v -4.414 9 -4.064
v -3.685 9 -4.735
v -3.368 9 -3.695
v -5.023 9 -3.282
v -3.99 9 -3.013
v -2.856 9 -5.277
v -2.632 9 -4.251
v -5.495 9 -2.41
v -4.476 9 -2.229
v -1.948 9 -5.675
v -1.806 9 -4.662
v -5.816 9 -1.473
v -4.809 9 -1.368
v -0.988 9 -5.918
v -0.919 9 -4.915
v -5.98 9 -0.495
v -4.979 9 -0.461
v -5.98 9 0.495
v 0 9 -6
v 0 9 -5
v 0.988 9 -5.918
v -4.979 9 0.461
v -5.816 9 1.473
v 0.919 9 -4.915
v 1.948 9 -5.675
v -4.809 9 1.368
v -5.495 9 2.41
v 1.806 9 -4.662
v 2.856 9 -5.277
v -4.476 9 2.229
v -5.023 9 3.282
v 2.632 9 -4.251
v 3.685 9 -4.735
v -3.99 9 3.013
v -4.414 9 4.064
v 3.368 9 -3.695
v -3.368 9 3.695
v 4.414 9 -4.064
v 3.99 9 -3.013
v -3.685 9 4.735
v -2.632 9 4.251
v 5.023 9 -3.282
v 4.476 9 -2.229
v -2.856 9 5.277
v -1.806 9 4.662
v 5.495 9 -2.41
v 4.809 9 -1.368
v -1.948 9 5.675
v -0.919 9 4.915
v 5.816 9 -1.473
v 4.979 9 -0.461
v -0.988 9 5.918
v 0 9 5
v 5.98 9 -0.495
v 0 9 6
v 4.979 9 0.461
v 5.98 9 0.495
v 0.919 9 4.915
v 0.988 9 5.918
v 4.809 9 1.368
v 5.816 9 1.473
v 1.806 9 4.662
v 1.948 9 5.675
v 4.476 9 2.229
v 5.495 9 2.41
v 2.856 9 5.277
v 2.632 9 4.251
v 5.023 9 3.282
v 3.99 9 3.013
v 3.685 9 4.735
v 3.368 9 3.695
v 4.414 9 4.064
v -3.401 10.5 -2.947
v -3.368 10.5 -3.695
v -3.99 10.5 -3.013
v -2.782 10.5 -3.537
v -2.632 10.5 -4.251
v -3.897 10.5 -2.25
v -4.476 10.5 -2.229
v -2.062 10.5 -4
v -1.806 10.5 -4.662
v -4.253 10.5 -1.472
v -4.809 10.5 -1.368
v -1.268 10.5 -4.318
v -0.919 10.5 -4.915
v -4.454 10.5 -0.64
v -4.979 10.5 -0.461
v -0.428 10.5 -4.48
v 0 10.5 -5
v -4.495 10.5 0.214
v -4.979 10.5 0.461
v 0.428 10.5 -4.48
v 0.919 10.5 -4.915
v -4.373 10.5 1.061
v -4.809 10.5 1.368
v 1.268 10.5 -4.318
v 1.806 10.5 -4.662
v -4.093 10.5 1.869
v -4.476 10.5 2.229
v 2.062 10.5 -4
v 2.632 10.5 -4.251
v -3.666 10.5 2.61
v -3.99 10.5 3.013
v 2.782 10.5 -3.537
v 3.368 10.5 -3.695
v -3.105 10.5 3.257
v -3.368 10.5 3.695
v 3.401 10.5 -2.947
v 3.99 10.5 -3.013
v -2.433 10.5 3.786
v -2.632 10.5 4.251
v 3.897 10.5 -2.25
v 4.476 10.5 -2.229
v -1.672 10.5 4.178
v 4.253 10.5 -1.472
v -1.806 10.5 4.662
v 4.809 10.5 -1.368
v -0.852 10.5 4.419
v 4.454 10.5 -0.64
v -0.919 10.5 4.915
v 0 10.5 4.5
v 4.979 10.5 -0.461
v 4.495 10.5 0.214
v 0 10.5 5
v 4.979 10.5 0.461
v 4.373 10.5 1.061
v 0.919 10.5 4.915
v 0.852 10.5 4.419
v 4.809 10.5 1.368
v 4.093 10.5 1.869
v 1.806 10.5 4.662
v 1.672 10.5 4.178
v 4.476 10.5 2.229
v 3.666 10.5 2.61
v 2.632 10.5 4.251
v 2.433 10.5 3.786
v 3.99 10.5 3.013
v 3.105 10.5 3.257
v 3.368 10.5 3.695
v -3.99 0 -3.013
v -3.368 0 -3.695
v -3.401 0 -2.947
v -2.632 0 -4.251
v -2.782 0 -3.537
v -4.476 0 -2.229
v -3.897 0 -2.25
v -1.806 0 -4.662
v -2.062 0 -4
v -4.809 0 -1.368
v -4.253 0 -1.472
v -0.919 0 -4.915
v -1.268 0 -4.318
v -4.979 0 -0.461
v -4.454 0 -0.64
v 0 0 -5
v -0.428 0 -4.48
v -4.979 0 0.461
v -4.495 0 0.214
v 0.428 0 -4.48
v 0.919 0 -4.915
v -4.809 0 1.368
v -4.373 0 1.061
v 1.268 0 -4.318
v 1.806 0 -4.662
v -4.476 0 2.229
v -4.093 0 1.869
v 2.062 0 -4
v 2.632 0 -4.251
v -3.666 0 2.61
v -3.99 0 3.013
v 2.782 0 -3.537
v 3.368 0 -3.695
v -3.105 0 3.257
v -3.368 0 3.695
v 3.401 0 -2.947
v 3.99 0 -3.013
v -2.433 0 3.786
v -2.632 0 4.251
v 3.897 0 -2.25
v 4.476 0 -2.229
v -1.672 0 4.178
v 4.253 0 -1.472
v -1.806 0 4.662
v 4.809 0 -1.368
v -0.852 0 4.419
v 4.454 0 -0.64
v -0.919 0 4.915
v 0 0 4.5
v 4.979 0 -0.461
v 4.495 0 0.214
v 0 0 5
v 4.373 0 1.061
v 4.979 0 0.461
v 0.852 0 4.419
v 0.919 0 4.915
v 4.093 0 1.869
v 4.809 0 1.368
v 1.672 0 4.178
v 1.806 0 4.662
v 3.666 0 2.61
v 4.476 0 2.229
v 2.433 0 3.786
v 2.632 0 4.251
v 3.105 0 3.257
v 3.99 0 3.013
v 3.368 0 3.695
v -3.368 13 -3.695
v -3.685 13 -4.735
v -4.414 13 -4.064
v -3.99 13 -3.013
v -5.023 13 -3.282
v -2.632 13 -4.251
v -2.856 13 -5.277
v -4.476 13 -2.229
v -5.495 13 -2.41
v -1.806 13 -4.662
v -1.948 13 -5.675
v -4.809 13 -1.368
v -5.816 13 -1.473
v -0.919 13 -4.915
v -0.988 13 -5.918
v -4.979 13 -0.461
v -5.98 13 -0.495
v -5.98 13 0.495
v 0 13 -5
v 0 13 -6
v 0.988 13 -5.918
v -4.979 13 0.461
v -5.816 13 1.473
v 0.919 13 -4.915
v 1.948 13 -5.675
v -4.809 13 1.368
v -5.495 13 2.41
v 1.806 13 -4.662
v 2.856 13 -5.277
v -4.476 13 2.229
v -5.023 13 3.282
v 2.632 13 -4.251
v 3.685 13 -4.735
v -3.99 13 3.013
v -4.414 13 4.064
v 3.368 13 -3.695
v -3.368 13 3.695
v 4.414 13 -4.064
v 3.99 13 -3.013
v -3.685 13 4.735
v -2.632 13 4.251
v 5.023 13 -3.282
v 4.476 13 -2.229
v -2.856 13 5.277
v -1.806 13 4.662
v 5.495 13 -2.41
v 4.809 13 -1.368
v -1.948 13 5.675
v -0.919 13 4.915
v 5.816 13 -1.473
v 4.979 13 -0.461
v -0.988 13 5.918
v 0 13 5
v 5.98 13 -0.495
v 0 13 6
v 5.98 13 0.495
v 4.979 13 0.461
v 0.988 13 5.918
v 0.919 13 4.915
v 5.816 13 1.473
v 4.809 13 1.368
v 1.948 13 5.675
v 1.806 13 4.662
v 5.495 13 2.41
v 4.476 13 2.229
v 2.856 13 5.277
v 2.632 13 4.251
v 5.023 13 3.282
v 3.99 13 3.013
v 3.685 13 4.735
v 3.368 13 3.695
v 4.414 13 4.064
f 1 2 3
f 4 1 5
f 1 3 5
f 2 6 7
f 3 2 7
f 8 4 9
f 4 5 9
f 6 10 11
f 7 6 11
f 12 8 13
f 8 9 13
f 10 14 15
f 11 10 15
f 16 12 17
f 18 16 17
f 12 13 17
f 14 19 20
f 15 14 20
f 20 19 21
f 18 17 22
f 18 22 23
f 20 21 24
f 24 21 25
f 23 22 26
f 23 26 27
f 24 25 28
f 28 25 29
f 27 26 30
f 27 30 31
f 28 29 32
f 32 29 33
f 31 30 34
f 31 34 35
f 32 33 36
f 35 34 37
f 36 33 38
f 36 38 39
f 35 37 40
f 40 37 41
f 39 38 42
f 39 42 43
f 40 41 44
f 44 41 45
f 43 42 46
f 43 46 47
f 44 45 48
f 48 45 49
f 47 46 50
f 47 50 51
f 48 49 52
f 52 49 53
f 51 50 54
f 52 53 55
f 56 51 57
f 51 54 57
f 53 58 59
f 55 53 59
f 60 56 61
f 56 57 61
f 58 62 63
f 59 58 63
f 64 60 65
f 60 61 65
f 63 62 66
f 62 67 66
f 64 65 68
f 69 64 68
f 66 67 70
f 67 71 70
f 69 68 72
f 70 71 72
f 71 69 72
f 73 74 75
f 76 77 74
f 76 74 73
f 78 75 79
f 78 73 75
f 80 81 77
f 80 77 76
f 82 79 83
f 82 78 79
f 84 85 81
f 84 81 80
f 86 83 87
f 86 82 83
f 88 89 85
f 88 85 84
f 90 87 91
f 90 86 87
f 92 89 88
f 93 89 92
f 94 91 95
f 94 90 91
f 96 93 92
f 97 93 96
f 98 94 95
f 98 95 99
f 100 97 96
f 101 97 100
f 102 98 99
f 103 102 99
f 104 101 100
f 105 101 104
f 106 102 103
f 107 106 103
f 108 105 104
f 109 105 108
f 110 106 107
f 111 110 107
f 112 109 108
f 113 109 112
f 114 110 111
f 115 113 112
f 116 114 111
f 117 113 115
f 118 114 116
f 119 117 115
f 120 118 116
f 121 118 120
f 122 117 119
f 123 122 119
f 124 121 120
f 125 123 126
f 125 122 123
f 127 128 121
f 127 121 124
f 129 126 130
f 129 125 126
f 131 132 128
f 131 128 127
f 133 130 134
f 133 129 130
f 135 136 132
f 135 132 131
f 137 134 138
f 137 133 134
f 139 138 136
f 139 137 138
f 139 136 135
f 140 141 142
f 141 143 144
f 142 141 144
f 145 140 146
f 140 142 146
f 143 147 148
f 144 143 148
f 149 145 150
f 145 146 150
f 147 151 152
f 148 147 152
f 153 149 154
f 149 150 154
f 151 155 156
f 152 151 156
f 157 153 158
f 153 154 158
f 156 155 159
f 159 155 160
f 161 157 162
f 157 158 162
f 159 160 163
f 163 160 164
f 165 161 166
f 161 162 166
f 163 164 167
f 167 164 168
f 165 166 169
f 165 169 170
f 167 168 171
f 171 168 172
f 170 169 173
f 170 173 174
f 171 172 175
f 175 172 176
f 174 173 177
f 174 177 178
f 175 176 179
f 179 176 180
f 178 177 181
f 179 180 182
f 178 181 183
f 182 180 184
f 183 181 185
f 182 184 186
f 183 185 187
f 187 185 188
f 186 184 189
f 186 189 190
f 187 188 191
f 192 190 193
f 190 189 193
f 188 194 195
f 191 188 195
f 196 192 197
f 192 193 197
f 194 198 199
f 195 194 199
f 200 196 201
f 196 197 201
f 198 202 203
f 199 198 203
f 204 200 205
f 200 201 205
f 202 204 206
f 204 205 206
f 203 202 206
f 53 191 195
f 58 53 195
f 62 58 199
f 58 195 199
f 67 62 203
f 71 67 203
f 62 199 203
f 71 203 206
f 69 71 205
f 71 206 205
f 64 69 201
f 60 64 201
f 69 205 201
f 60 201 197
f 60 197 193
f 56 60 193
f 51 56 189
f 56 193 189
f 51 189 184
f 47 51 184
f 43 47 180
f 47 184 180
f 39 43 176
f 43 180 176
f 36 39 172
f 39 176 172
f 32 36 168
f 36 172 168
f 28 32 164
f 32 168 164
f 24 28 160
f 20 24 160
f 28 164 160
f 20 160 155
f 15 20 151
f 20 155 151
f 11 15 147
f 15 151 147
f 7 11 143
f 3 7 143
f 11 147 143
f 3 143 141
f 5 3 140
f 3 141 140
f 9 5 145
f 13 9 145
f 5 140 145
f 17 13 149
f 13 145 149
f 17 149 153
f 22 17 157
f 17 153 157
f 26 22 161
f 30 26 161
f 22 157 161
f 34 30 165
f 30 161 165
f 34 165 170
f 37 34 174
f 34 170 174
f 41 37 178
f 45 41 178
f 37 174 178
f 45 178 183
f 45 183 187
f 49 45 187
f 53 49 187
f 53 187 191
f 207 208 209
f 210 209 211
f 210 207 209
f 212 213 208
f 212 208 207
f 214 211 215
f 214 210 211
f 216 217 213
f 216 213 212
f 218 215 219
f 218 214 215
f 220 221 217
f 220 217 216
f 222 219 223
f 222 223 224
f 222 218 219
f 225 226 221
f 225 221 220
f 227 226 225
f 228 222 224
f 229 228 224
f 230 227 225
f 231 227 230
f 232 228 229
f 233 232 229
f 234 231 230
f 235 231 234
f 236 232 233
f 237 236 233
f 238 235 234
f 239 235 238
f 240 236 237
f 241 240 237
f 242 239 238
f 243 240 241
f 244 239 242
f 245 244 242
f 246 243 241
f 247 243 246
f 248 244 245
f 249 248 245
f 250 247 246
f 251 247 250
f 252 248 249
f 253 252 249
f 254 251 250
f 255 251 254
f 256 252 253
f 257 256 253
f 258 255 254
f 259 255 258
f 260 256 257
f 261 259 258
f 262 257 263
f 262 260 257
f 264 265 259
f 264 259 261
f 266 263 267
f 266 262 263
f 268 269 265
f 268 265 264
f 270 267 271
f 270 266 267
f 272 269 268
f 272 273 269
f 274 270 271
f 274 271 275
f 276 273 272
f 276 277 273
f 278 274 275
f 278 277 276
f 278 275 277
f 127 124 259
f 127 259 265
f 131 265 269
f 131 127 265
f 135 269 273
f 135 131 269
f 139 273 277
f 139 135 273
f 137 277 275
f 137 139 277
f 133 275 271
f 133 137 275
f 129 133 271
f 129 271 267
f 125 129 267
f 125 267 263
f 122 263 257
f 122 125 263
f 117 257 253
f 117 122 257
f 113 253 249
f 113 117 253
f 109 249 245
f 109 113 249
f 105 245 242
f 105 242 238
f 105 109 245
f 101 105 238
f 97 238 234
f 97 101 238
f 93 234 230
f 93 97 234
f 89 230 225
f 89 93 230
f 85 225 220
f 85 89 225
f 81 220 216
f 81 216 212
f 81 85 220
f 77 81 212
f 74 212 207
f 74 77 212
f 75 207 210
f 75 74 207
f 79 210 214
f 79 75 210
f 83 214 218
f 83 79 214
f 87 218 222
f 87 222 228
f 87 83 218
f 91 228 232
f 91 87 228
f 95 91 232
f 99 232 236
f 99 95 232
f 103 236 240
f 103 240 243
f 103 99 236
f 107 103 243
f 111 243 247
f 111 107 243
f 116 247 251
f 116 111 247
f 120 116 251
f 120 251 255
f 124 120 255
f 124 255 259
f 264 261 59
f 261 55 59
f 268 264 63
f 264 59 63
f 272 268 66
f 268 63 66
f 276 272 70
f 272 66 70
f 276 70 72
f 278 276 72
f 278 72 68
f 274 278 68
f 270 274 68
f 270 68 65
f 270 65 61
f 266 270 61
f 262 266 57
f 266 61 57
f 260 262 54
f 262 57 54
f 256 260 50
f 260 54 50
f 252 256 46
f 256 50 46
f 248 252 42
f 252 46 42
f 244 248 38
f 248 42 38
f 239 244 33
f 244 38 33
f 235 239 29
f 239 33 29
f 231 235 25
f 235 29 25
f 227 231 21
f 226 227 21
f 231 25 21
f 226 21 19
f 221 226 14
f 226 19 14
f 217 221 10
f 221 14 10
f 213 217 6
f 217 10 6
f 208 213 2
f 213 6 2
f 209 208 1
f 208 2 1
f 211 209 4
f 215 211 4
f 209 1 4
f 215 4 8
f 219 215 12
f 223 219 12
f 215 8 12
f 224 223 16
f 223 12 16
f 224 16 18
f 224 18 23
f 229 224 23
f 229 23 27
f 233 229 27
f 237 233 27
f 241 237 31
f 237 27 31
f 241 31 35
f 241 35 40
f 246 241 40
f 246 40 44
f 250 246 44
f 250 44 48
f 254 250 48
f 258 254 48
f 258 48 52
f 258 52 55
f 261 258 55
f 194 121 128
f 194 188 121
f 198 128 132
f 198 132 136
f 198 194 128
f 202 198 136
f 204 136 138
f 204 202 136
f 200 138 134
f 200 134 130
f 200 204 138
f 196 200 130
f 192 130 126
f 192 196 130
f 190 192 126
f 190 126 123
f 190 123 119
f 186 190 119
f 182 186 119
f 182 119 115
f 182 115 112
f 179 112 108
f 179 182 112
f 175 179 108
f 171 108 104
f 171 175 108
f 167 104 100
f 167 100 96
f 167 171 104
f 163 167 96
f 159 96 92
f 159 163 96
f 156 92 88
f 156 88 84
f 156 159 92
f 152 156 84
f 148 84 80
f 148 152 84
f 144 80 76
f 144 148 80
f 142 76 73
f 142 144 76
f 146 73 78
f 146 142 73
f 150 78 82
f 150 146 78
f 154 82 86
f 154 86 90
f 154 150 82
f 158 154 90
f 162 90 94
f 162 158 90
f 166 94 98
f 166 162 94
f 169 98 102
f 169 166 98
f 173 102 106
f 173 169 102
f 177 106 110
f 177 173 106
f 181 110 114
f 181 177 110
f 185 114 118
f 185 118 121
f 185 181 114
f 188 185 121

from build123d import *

# Parameters (mm, degrees)
ESQUISSE1_R        = 5
ESQUISSE1_R_2      = 4.5
BOSS_EXTRU_1_DEPTH = 9
ESQUISSE2_R        = 6
ESQUISSE2_R_2      = 5
ESQUISSE2_R_3      = 4.5
BOSS_EXTRU_2_DEPTH = 1.5
ESQUISSE3_R        = 6
ESQUISSE3_R_2      = 5
BOSS_EXTRU_3_DEPTH = 2.5


with BuildPart() as part:
    # Esquisse1 → Boss.-Extru.1 (new body)
    with BuildSketch(Plane(origin=(0, 0, 0), x_dir=(1, 0, 0), z_dir=(0, 1, 0))):
        with Locations(Location((0, 0, 0), (0, 0, 270))):
            Circle(ESQUISSE1_R)
        with Locations(Location((0, 0, 0), (0, 0, 270))):
            Circle(ESQUISSE1_R_2, mode=Mode.SUBTRACT)
    extrude(amount=BOSS_EXTRU_1_DEPTH)

    # Esquisse2 → Boss.-Extru.2 (add)
    # profile 1 of 2: a face of its own
    with BuildSketch(Plane(origin=(0, 9, 0), x_dir=(1, 0, 0), z_dir=(0, 1, 0))):
        with Locations(Location((0, 0, 0), (0, 0, 270))):
            Circle(ESQUISSE2_R)
        with Locations(Location((0, 0, 0), (0, 0, 270))):
            Circle(ESQUISSE2_R_2, mode=Mode.SUBTRACT)
    # profile 2 of 2: a face of its own
    with BuildSketch(Plane(origin=(0, 9, 0), x_dir=(1, 0, 0), z_dir=(0, 1, 0))):
        with Locations(Location((0, 0, 0), (0, 0, 270))):
            Circle(ESQUISSE2_R_2)
        with Locations(Location((0, 0, 0), (0, 0, 270))):
            Circle(ESQUISSE2_R_3, mode=Mode.SUBTRACT)
    extrude(amount=BOSS_EXTRU_2_DEPTH)

    # Esquisse3 → Boss.-Extru.3 (add)
    with BuildSketch(Plane(origin=(0, 10.5, 0), x_dir=(1, 0, 0), z_dir=(0, 1, 0))):
        with Locations(Location((0, 0, 0), (0, 0, 270))):
            Circle(ESQUISSE3_R)
        with Locations(Location((0, 0, 0), (0, 0, 270))):
            Circle(ESQUISSE3_R_2, mode=Mode.SUBTRACT)
    extrude(amount=BOSS_EXTRU_3_DEPTH)


solid = part.part
